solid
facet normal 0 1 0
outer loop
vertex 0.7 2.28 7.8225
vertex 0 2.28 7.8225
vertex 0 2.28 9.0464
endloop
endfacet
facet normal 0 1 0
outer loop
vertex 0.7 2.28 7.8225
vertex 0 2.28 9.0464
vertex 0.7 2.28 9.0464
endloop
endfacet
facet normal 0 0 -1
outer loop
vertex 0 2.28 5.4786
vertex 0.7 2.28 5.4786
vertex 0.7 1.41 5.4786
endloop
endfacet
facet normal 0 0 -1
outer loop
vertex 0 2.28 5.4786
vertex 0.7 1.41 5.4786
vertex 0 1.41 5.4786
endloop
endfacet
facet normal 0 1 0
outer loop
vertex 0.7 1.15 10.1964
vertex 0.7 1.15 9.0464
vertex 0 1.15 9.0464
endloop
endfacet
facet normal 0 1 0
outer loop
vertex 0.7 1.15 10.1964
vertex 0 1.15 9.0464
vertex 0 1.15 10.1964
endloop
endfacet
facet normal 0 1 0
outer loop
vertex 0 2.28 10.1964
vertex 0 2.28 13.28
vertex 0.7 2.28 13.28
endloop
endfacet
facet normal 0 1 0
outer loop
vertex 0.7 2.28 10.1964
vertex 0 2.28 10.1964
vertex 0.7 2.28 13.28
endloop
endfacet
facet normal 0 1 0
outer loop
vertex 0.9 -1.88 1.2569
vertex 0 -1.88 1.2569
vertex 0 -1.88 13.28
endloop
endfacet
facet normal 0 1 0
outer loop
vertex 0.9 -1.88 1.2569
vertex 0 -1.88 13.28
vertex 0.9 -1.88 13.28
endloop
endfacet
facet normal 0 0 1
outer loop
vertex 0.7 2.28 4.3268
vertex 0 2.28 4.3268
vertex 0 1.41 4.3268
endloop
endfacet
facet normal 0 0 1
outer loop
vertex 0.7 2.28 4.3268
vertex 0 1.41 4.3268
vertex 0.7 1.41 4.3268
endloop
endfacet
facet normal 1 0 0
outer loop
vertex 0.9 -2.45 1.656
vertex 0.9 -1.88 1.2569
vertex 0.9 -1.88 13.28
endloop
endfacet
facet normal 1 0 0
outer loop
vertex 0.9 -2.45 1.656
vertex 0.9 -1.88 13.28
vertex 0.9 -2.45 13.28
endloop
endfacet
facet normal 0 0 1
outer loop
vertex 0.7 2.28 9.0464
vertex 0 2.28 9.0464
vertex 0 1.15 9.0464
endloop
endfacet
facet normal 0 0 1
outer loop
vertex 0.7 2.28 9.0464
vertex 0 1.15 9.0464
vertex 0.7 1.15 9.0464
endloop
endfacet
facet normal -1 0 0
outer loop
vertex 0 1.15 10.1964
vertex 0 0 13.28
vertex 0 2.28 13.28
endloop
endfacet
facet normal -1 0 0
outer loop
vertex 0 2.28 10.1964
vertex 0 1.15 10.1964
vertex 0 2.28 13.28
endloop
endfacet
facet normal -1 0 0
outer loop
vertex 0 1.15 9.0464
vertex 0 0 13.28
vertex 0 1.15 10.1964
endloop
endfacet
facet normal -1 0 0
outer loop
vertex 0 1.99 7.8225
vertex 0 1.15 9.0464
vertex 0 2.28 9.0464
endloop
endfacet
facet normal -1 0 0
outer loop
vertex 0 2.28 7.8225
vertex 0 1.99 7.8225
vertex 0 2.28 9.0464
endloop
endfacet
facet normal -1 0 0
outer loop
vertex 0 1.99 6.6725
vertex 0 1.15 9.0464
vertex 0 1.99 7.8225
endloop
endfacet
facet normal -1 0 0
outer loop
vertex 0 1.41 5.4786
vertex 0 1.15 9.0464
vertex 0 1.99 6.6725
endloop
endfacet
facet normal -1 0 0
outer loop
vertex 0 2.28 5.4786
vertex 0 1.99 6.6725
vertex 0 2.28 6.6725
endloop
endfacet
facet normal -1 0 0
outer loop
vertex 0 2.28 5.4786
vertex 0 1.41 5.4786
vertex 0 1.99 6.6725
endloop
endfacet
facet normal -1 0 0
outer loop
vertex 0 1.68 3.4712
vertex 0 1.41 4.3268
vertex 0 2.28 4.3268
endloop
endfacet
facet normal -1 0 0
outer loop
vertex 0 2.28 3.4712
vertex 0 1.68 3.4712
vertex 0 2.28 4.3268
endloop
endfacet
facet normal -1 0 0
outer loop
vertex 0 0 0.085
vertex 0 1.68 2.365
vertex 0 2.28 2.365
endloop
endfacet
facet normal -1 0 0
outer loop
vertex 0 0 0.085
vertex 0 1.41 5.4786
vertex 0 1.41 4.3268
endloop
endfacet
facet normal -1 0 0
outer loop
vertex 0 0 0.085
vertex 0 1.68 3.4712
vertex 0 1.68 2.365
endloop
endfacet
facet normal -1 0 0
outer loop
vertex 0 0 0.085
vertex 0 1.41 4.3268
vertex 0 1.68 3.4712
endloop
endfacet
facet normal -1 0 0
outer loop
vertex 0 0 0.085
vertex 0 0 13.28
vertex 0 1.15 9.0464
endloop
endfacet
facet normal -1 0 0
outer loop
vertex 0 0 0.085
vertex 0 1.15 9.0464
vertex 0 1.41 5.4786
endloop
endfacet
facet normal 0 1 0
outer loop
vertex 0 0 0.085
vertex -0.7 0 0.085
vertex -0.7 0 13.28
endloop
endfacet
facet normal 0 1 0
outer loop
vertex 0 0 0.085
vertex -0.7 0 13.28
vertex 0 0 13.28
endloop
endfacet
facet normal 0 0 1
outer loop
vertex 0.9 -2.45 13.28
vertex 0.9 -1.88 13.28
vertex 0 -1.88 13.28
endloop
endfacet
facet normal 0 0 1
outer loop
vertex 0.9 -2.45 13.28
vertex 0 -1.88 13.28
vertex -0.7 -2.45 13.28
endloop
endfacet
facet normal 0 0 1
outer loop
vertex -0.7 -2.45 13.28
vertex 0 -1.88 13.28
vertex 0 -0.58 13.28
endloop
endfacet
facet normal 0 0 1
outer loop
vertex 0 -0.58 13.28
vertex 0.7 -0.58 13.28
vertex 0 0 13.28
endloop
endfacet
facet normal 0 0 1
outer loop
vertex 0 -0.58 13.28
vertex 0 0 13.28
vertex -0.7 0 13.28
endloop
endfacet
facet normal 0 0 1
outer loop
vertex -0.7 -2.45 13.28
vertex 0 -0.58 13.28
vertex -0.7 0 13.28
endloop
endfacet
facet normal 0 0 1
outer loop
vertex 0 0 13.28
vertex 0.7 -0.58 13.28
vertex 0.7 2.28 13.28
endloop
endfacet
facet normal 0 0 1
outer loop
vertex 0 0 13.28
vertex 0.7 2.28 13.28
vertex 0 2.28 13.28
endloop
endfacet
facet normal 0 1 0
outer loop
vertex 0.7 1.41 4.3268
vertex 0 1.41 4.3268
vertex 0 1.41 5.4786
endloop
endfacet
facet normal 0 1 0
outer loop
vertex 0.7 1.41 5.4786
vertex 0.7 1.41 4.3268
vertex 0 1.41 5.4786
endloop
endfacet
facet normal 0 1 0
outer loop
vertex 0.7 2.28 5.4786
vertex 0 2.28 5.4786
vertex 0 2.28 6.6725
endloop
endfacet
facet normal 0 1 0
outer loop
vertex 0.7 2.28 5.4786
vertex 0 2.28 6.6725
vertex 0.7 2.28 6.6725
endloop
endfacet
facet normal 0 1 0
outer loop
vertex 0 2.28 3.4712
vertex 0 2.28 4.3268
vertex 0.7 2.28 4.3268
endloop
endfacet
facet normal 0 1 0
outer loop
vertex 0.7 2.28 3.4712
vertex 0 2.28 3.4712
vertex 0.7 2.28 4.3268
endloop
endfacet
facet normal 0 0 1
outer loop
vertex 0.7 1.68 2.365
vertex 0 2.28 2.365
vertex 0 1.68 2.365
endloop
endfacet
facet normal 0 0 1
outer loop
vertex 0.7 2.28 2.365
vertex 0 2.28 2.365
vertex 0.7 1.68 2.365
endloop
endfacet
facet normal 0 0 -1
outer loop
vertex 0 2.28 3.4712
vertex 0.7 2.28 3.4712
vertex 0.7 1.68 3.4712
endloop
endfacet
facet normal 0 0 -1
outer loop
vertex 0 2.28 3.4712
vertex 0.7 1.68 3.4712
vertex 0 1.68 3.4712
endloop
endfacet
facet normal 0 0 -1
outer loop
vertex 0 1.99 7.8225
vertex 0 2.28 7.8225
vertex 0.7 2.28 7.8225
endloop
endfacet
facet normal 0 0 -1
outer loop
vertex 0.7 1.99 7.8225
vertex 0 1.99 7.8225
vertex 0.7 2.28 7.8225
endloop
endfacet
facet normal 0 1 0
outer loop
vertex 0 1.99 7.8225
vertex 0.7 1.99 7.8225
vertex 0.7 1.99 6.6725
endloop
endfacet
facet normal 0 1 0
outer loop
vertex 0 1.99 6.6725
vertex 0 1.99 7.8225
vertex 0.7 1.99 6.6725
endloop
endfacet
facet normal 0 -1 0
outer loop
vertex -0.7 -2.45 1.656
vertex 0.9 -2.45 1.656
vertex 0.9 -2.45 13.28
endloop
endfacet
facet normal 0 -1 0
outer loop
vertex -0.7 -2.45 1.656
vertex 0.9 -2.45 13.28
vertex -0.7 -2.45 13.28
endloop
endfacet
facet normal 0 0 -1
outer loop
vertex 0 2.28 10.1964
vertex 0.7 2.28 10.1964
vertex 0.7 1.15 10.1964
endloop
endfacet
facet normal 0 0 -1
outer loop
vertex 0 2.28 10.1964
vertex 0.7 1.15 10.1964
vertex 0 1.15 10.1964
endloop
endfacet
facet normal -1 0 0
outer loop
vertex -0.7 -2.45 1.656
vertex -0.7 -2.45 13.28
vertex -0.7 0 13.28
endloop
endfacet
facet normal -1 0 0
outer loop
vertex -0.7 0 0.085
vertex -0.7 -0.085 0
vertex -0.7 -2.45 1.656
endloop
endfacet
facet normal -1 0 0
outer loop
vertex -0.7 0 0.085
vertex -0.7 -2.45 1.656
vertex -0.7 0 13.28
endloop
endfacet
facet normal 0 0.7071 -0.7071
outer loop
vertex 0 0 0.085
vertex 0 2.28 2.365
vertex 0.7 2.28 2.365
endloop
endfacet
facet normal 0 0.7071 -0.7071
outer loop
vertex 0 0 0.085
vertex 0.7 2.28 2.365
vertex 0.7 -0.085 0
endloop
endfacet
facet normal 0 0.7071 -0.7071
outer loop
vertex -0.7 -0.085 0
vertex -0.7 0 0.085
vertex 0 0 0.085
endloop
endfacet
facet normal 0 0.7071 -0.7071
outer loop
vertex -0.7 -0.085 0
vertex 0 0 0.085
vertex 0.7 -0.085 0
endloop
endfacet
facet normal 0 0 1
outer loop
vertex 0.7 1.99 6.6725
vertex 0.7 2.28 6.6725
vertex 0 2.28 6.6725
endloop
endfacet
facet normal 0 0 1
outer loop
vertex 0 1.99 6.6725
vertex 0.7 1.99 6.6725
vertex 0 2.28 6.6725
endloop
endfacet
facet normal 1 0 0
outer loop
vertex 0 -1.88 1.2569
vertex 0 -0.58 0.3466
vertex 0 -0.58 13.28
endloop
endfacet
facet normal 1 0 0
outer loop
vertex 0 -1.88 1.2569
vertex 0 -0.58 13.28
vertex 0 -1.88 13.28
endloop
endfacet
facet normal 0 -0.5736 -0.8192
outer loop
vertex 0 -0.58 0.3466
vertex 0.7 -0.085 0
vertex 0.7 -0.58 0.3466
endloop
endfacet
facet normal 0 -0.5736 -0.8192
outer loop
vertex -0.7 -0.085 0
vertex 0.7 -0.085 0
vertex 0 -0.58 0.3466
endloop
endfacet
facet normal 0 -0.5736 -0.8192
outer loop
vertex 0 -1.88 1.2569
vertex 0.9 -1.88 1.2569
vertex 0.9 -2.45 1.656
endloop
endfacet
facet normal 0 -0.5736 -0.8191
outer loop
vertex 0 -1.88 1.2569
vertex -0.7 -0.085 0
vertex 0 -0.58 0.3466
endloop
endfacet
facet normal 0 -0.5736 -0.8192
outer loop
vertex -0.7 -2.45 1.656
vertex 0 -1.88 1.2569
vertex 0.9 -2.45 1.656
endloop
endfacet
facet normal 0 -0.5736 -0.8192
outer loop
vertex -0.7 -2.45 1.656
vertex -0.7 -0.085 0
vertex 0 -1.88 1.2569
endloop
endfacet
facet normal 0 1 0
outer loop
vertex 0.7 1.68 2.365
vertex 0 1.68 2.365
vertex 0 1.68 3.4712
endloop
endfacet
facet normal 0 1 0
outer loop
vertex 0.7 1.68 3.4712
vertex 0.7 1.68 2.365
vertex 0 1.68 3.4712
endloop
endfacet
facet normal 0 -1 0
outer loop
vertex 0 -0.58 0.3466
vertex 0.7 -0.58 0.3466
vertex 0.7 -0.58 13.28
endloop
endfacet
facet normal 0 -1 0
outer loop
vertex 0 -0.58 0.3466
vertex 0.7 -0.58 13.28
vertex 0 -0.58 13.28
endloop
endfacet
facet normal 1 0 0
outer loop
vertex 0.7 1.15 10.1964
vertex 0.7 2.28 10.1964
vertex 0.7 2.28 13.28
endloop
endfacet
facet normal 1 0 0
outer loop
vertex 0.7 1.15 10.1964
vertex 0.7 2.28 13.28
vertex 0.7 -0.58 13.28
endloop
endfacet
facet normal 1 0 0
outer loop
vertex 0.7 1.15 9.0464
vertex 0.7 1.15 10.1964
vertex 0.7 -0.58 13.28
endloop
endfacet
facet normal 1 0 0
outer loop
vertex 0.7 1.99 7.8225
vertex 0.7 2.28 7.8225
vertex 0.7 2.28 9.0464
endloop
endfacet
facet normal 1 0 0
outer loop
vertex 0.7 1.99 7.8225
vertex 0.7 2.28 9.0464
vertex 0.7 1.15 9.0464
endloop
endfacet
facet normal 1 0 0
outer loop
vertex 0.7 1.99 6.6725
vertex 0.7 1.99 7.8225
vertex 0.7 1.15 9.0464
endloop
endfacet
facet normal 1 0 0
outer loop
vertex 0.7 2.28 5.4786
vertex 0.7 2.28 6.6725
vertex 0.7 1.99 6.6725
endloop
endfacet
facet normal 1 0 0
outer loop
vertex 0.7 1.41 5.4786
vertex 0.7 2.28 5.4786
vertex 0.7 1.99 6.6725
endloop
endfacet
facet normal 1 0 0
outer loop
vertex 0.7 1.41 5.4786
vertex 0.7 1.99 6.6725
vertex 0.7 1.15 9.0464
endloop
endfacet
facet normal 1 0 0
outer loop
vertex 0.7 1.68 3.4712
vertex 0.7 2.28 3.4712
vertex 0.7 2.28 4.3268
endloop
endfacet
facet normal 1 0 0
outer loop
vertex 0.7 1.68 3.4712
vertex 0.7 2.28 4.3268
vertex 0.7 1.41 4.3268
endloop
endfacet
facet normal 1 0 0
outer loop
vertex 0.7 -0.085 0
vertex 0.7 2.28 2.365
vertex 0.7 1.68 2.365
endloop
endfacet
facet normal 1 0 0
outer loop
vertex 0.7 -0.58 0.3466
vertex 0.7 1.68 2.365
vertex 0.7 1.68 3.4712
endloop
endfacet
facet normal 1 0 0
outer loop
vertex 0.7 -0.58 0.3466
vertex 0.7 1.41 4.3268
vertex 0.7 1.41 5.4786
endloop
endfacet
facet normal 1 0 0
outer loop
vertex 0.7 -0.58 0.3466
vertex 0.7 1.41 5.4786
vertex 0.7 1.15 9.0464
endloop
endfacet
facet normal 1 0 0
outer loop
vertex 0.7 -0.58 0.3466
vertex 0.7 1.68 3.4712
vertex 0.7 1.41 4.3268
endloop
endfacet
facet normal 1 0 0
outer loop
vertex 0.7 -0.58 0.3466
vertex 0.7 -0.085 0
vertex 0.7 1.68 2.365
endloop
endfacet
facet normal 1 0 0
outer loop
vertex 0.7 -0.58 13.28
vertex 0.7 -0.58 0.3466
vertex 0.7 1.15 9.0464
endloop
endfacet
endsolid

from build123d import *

# Parameters (mm, degrees)
BOSS_EXTRUDE1_DEPTH     = 13.28
CUT_EXTRUDE1_DEPTH      = 14.53406443
CUT_EXTRUDE1_DEPTH_BACK = 14.53406443
CUT_EXTRUDE5_DEPTH      = 0.29
CUT_EXTRUDE6_DEPTH      = 1.13
CUT_EXTRUDE7_DEPTH      = 0.87
CUT_EXTRUDE8_DEPTH      = 0.6


with BuildPart() as part:
    # Sketch1 → Boss-Extrude1 (new body)
    with BuildSketch(Plane.XY):
        Polygon((0, 0), (0, 2.28), (0.7, 2.28), (0.7, -0.58), (0, -0.58), (0, -1.88), (0.9, -1.88), (0.9, -2.45), (-0.7, -2.45), (-0.7, 0), align=None)
    extrude(amount=BOSS_EXTRUDE1_DEPTH)

    # Sketch2 → Cut-Extrude1 (cut, two sides)
    with BuildSketch(Plane(origin=(0, 0, 0), x_dir=(0, 0, -1), z_dir=(1, 0, 0))) as cut_extrude1_sk:
        Polygon((0.8, -2.75), (0.8, -0.085), (0.8, 2.58), (-2.665, 2.58), (0, -0.085), (-1.866053089, -2.75), align=None)
    extrude(amount=CUT_EXTRUDE1_DEPTH, mode=Mode.SUBTRACT)
    extrude(cut_extrude1_sk.sketch, amount=-CUT_EXTRUDE1_DEPTH_BACK, mode=Mode.SUBTRACT)

    # 3DSketch1 → Cut-Extrude5 (cut)
    with BuildSketch(Plane(origin=(0.7, 2.28, 7.8225), x_dir=(-0.5199469468957453, 0, -0.8541985556144386), z_dir=(0, 1, 0))):
        Polygon((0, 0), (0.982328339, -0.597938989), (1.346291202, 0), (0.363962863, 0.597938989), align=None)
    extrude(amount=-CUT_EXTRUDE5_DEPTH, mode=Mode.SUBTRACT)

    # 3DSketch1<3> → Cut-Extrude6 (cut)
    with BuildSketch(Plane(origin=(0, 2.28, 10.196397445), x_dir=(0.5199469468957453, 0, -0.8541985556144386), z_dir=(0, 1, 0))):
        Polygon((0, 0), (0.982328339, 0.597938989), (1.346291202, 0), (0.363962863, -0.597938989), align=None)
    extrude(amount=-CUT_EXTRUDE6_DEPTH, mode=Mode.SUBTRACT)

    # 3DSketch1<4> → Cut-Extrude7 (cut)
    with BuildSketch(Plane(origin=(0, 2.28, 5.478611146), x_dir=(0.519345577670118, 0, -0.8545643164528294), z_dir=(0, 1, 0))):
        Polygon((0, 0), (0.984308217, 0.598195022), (1.347850122, 0), (0.363541904, -0.598195022), align=None)
    extrude(amount=-CUT_EXTRUDE7_DEPTH, mode=Mode.SUBTRACT)

    # 3DSketch1<5> → Cut-Extrude8 (cut)
    with BuildSketch(Plane(origin=(0, 2.28, 3.471184381), x_dir=(0.5347339426738265, 0, -0.8450204793686985), z_dir=(0, 1, 0))):
        Polygon((0, 0), (0.934748456, 0.591514336), (1.309062216, 0), (0.37431376, -0.591514336), align=None)
    extrude(amount=-CUT_EXTRUDE8_DEPTH, mode=Mode.SUBTRACT)


solid = part.part
